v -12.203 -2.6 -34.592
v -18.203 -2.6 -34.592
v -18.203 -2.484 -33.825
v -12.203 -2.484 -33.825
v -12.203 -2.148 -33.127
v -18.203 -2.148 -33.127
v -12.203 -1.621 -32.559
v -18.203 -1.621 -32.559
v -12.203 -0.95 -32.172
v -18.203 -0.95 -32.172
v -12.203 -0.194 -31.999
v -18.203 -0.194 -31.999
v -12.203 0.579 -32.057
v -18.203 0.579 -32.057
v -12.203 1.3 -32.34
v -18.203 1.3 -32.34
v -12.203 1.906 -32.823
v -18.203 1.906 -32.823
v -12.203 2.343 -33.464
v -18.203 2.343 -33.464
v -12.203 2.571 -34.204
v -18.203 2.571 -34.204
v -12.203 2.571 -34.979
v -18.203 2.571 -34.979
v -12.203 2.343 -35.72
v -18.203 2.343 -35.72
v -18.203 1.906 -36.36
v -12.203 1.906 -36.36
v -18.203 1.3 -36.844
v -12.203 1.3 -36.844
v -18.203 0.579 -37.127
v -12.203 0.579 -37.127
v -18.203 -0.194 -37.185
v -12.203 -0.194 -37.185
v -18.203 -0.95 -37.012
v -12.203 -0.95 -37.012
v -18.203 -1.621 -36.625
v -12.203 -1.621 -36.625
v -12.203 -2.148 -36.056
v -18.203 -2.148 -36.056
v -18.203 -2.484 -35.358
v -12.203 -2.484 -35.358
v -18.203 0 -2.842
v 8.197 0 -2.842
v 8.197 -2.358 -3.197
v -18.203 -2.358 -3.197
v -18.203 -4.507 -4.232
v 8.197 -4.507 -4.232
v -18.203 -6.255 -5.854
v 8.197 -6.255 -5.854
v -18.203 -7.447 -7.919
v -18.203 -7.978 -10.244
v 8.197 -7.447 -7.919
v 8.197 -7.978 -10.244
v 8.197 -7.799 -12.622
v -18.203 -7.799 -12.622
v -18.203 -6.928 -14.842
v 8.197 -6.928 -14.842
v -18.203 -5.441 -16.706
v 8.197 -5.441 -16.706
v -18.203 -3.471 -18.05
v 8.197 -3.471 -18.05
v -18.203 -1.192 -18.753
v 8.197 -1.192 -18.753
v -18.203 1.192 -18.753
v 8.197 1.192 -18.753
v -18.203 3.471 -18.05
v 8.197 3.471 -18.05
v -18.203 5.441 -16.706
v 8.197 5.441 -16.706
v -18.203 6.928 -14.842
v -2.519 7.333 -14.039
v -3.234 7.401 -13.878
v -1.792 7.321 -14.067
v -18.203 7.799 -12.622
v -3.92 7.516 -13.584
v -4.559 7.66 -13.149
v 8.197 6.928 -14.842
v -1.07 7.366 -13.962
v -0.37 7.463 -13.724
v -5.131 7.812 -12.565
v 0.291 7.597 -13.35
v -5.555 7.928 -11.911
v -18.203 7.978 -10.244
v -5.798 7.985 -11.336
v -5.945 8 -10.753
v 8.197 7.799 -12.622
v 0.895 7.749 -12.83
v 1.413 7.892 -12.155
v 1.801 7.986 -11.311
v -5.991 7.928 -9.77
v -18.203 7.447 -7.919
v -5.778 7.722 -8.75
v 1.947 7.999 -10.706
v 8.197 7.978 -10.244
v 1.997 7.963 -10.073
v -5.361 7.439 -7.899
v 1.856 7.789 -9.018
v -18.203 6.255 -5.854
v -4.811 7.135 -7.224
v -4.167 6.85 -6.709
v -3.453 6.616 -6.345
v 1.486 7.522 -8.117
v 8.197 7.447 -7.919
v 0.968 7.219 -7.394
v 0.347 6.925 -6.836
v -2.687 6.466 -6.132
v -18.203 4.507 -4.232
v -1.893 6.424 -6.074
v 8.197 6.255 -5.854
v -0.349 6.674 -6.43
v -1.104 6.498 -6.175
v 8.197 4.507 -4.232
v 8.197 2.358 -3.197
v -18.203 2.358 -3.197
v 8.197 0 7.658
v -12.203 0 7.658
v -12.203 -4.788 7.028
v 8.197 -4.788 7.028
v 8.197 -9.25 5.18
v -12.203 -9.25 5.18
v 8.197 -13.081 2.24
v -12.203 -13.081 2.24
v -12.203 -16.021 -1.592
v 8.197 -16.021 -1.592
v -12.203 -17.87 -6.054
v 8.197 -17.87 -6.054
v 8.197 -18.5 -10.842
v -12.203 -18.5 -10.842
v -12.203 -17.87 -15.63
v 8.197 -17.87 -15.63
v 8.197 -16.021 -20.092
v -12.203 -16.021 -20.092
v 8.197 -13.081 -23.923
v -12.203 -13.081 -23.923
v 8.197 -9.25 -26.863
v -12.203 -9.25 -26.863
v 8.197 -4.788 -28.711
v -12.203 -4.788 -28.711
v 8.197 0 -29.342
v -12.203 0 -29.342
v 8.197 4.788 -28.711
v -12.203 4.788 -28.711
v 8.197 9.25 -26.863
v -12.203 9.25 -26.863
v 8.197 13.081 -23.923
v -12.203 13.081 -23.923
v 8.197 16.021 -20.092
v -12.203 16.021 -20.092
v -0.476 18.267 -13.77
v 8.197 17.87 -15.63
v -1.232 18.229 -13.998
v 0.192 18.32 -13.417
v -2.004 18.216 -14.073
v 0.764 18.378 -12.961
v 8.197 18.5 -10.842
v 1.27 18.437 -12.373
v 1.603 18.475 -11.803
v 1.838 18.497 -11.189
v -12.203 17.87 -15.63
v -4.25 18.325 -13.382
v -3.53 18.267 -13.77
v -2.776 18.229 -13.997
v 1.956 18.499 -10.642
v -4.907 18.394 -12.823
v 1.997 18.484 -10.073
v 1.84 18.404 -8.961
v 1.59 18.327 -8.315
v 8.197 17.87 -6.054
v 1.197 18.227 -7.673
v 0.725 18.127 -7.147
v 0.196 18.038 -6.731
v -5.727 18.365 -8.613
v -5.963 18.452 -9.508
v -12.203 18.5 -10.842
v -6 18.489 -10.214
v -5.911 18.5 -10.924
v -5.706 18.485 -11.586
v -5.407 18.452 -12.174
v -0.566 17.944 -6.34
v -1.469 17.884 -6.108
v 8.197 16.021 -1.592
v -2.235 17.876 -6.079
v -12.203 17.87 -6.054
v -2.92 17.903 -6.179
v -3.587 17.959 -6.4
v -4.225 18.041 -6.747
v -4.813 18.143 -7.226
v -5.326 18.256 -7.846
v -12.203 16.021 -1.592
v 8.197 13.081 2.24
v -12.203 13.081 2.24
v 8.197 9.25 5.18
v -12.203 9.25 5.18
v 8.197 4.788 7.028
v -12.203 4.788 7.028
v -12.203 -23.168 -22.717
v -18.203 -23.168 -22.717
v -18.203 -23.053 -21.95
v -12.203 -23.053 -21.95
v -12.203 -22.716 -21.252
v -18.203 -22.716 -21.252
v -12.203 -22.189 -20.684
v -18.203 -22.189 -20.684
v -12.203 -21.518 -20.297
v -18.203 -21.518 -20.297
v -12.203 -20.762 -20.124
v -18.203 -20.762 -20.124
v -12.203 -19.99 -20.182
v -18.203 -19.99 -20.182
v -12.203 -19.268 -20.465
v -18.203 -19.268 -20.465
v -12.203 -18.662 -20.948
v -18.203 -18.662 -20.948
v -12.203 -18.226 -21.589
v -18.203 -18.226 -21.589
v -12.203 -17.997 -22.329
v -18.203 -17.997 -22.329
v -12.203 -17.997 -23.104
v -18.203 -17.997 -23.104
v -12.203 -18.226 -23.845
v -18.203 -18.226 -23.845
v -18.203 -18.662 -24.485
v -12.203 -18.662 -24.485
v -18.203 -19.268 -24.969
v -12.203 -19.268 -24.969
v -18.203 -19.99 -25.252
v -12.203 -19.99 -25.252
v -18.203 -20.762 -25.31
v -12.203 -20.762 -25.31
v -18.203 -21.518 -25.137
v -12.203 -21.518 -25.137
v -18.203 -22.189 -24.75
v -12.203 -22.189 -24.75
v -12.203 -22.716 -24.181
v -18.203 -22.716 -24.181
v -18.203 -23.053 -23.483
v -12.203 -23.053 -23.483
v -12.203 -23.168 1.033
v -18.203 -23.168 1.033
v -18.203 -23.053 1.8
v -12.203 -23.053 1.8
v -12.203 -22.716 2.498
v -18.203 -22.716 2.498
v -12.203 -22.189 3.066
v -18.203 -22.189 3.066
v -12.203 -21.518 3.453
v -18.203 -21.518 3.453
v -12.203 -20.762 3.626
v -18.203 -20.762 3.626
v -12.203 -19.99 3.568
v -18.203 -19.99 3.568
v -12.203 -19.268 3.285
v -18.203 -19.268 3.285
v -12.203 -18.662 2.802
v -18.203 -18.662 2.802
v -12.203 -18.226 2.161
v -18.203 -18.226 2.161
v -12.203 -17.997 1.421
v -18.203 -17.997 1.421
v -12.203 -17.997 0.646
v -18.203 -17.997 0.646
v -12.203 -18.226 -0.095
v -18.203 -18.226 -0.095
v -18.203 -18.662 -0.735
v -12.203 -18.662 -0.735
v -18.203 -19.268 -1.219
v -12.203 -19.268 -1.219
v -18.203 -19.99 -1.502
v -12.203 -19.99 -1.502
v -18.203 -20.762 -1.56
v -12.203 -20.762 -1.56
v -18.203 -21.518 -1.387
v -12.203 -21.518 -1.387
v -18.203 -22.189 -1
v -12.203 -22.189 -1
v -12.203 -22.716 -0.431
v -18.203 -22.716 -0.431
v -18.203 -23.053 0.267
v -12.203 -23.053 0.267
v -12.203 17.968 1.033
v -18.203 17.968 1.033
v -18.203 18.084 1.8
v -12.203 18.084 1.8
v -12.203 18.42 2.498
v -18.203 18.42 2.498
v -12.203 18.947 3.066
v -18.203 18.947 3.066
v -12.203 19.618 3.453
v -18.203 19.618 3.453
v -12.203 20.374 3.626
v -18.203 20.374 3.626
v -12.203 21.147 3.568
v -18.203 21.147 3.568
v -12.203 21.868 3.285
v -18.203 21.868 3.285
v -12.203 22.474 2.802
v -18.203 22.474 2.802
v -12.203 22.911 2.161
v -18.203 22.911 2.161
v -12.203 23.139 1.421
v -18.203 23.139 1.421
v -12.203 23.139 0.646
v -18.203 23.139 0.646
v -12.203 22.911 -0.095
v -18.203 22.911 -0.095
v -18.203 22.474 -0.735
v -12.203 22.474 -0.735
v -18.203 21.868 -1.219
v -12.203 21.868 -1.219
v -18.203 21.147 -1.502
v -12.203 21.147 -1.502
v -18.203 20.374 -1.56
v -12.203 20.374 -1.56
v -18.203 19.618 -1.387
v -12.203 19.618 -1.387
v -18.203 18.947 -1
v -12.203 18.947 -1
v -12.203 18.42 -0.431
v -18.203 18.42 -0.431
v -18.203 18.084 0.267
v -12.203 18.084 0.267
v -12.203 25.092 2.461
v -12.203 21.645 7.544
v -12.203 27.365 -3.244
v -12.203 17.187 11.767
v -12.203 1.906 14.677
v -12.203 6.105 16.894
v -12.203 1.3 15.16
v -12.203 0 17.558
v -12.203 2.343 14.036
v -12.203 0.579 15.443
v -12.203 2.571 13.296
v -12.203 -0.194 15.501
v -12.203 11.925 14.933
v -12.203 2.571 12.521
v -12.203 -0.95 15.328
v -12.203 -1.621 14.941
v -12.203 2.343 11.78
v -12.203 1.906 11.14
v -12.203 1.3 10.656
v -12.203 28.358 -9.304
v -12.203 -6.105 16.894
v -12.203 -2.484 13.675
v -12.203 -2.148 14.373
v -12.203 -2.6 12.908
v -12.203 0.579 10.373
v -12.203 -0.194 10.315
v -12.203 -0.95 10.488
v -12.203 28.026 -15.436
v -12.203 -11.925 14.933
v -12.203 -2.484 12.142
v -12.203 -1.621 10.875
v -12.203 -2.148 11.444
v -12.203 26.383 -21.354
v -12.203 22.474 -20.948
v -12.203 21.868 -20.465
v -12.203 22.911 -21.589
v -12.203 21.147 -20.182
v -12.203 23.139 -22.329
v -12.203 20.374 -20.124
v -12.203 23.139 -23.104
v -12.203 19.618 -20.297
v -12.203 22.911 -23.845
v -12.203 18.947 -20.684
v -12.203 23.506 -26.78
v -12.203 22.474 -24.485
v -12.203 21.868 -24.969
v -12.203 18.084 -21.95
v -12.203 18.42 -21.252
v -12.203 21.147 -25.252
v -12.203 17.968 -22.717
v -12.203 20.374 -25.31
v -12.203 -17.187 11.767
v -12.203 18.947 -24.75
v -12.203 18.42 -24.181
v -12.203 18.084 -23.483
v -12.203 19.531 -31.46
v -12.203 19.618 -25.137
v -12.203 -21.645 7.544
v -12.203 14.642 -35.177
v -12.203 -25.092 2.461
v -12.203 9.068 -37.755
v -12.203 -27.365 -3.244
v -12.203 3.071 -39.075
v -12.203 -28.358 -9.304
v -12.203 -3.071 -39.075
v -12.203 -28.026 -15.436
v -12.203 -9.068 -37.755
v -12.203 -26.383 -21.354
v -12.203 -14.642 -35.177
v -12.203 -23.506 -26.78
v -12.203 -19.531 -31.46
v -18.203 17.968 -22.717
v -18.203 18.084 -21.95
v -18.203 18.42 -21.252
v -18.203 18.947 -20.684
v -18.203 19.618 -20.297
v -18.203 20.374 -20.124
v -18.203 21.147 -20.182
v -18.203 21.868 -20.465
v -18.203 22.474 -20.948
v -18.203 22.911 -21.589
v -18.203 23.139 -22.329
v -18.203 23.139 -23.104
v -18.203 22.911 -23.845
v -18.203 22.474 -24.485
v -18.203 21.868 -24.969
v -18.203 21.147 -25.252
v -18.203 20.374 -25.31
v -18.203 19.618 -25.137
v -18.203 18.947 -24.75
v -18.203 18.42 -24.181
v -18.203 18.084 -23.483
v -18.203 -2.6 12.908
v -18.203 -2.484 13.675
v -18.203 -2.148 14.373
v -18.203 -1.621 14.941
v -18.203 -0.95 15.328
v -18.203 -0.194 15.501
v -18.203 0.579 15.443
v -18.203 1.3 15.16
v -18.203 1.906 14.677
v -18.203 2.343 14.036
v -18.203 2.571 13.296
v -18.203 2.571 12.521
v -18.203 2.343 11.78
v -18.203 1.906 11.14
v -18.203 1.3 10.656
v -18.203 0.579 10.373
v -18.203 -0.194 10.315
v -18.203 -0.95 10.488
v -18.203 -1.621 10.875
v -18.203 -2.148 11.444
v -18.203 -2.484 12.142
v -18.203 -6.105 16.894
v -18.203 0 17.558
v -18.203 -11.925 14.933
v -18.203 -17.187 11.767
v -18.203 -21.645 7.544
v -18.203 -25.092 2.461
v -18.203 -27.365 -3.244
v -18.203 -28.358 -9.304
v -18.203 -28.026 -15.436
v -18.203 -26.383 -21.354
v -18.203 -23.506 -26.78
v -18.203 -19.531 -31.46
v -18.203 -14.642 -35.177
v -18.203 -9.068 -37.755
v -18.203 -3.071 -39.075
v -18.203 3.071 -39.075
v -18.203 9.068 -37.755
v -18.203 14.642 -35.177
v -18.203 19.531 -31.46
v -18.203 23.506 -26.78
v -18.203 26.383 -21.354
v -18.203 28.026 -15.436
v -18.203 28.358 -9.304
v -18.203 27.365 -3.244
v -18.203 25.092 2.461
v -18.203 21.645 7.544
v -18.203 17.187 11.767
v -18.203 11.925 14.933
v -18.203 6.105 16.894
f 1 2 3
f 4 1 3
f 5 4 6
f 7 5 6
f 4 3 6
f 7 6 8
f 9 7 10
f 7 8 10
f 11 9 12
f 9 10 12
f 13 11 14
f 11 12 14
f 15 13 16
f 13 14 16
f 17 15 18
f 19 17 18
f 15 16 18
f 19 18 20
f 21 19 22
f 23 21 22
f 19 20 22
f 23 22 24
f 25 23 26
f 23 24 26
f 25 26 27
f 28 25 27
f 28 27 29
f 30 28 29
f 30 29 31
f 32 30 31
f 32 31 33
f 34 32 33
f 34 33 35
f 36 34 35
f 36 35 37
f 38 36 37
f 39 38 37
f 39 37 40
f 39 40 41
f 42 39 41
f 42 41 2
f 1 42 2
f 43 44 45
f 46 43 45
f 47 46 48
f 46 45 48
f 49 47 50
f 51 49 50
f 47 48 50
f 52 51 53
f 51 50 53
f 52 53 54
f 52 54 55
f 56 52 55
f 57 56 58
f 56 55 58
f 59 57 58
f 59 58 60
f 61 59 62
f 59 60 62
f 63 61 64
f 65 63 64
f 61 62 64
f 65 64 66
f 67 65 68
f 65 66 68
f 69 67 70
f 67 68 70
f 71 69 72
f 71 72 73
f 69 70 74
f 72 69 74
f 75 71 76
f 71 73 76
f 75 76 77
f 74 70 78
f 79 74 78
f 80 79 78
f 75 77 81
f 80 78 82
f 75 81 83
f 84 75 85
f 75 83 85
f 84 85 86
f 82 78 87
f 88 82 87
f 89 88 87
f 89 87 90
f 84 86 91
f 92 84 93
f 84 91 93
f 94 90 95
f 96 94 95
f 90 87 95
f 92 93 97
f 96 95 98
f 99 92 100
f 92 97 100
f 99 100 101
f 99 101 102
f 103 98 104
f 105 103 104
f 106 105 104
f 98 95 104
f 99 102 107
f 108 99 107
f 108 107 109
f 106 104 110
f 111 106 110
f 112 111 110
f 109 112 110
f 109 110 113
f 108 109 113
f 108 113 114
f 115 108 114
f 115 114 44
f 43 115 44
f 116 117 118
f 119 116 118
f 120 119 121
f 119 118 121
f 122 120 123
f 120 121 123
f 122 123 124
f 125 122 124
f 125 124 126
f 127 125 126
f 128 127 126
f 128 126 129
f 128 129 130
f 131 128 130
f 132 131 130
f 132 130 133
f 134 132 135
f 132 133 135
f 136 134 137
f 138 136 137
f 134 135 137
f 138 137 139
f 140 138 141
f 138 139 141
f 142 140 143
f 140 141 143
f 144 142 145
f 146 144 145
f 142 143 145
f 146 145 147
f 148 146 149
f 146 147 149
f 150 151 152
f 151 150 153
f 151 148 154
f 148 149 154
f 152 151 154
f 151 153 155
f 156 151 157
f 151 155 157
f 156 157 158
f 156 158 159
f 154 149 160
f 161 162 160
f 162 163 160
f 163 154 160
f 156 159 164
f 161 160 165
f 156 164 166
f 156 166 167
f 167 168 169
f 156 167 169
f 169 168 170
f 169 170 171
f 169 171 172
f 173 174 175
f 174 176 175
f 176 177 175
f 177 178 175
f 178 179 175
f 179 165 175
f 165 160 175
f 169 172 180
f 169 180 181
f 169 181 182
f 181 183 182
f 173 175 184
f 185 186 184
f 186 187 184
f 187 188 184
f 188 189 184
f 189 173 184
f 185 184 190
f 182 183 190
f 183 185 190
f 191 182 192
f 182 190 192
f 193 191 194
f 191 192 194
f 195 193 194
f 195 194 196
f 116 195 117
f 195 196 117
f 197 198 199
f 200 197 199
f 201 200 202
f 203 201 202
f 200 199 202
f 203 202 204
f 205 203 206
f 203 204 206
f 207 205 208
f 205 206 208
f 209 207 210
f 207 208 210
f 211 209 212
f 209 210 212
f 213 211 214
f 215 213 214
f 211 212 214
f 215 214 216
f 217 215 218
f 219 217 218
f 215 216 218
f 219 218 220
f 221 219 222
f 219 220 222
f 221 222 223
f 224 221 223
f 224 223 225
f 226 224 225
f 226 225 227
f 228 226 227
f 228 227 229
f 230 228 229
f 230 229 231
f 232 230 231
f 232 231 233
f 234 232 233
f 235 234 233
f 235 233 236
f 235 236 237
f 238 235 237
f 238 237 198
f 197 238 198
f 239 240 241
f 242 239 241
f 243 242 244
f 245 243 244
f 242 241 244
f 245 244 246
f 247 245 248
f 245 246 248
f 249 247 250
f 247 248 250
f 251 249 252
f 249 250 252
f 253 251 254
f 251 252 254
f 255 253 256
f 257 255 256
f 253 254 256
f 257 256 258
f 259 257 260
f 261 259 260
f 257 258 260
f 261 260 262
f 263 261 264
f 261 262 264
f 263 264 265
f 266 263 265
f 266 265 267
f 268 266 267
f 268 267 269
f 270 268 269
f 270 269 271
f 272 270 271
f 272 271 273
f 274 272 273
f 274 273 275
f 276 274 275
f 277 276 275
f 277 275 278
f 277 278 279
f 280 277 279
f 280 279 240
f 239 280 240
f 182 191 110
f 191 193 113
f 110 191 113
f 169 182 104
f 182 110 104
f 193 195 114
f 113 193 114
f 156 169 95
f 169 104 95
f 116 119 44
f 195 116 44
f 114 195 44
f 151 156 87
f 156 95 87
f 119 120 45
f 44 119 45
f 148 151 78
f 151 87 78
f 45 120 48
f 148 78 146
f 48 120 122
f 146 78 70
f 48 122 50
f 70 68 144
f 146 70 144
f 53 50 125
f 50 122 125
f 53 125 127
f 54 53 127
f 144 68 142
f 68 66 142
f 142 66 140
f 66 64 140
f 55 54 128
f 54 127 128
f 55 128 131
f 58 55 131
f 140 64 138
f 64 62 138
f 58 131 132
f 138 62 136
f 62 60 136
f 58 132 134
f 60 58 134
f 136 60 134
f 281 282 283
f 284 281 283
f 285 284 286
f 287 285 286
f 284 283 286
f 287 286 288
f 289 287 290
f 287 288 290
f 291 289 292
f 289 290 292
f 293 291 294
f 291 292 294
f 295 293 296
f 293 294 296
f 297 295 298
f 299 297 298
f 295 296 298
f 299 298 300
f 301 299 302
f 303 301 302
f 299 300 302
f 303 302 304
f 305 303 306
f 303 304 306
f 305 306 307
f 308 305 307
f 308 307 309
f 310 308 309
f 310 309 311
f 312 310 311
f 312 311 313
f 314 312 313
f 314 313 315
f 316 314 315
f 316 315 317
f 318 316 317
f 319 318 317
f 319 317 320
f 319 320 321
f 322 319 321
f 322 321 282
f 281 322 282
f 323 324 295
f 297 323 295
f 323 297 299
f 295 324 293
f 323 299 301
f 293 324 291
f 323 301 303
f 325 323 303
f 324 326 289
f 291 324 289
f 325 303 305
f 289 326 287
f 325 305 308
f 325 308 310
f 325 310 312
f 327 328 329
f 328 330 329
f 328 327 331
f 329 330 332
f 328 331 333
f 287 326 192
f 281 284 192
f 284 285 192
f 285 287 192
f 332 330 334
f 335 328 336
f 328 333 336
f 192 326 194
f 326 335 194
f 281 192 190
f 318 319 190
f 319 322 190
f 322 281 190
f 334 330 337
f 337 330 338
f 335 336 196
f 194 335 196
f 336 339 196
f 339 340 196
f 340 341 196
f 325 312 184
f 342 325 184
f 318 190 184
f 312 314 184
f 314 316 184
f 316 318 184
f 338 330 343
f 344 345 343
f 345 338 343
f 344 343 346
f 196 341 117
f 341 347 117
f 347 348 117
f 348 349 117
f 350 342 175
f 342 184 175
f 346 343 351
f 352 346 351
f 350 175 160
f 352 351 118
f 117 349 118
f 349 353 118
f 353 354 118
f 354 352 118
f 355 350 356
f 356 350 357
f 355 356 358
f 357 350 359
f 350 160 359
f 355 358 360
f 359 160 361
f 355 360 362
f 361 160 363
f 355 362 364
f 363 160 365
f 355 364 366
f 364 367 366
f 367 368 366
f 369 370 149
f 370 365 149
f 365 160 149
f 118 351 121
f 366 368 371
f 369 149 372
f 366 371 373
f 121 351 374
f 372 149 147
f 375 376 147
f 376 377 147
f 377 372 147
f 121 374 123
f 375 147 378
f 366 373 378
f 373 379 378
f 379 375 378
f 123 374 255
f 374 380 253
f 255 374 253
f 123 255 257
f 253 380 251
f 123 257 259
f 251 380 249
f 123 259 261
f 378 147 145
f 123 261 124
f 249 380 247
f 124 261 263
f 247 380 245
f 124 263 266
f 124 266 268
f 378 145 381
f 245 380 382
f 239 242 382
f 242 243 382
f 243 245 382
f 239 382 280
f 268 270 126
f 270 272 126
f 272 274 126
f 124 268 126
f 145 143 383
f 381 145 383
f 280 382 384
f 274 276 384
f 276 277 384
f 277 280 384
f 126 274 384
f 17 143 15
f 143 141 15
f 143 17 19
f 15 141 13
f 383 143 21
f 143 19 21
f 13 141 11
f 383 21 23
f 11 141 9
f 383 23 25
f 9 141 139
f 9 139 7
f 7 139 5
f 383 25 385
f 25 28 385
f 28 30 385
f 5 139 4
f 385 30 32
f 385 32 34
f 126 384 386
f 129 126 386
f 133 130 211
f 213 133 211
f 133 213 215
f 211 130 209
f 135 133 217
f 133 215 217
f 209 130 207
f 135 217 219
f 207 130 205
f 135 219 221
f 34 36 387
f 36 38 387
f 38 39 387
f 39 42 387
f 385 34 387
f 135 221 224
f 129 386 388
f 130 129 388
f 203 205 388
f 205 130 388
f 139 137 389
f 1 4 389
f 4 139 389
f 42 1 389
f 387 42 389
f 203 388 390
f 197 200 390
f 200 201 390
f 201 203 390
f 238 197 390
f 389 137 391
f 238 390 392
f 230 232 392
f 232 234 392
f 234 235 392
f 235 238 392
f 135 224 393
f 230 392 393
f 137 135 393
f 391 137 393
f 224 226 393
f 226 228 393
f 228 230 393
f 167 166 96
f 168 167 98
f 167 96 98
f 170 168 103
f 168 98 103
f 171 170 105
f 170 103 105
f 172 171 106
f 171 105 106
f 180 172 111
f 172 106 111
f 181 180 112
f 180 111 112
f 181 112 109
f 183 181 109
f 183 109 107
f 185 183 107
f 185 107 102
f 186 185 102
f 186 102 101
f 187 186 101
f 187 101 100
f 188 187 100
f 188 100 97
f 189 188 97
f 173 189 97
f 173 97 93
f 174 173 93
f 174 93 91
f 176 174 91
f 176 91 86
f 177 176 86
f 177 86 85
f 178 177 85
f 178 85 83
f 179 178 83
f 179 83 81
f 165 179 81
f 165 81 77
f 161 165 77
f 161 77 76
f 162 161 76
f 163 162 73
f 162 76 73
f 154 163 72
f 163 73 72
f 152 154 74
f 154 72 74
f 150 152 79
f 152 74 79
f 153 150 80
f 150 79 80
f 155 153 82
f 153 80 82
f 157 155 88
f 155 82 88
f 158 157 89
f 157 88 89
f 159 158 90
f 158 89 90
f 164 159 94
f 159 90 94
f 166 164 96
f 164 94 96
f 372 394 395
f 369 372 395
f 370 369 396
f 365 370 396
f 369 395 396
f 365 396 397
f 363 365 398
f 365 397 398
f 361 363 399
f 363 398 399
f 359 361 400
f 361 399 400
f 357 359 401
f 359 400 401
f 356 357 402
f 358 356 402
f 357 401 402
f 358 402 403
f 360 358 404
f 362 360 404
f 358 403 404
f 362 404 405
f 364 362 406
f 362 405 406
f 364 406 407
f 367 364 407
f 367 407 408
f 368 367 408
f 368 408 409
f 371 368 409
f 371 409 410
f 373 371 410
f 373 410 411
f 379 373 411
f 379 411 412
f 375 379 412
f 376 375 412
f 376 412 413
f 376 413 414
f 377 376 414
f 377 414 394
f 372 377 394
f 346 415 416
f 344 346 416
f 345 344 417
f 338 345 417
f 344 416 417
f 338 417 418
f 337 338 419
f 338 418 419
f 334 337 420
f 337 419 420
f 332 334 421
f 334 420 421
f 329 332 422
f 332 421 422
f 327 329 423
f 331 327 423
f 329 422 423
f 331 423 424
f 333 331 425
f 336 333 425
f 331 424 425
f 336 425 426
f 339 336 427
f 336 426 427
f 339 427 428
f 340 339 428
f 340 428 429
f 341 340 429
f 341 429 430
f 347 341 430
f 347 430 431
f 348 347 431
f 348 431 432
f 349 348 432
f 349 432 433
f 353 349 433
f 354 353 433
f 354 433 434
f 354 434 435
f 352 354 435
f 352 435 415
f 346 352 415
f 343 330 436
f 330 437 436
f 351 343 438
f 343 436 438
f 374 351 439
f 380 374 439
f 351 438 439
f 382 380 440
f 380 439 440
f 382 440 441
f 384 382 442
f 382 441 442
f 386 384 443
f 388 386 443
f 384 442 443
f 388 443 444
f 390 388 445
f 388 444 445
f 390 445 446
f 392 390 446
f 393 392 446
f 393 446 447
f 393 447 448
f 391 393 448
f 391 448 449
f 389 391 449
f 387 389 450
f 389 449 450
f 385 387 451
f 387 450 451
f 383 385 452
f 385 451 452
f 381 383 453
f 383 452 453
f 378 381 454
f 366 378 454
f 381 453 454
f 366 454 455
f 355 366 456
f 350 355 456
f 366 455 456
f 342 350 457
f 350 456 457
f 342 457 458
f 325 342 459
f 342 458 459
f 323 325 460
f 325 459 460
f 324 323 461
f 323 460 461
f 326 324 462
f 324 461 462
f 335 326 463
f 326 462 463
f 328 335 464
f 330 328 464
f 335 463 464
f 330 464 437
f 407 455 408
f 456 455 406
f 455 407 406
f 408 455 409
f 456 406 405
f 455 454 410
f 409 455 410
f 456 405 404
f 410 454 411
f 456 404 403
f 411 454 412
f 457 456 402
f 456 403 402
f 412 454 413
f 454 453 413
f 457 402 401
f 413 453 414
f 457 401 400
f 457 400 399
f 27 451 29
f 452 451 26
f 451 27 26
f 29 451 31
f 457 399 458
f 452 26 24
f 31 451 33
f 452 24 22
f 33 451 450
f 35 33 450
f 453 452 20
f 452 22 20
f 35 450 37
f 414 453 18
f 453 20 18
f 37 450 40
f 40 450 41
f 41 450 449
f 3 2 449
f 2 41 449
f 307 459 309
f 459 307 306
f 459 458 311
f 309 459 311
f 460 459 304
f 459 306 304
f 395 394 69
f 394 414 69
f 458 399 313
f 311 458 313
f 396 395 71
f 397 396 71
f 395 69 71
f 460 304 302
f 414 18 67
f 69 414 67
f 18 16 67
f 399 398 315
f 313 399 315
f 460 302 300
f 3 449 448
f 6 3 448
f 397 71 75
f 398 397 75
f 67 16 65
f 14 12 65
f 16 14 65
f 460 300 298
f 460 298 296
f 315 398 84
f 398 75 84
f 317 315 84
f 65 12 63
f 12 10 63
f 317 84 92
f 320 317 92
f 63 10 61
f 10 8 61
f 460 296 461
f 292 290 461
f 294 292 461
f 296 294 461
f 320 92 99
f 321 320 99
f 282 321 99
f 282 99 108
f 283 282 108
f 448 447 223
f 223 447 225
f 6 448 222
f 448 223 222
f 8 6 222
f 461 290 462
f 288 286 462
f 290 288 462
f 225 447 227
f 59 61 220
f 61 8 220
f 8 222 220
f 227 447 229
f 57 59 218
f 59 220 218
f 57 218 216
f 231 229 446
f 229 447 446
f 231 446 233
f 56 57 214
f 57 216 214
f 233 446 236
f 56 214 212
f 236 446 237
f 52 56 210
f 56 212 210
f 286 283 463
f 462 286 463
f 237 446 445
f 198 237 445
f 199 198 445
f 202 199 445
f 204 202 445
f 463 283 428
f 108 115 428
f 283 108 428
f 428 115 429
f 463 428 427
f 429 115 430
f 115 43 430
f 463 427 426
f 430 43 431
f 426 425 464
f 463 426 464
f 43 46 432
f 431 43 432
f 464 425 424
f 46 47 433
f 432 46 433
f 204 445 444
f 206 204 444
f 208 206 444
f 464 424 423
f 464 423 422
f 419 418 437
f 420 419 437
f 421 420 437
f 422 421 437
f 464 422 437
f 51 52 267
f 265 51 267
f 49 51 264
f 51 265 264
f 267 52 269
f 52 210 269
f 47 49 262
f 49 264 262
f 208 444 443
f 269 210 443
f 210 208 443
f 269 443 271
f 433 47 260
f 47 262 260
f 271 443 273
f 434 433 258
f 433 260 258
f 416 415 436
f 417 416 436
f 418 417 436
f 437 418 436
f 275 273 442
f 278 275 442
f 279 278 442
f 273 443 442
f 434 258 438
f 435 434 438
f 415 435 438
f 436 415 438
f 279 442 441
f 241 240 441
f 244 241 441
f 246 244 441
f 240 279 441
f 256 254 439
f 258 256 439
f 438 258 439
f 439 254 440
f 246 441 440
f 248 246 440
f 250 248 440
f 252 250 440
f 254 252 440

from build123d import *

# Parameters (mm, degrees)
F2_R     = 2.6
F3_DEPTH = 25
F4_R     = 4
F5_DEPTH = 25


with BuildPart() as f1:
    # F0 (on Front) → F1 (revolve)
    with BuildSketch(Plane.XZ):
        Polygon((-18.202801, -2.841857), (8.197199, -2.841857), (8.197199, 7.658143), (-12.202801, 7.658143), (-12.202801, 17.558143), (-18.202801, 17.558143), align=None)
    revolve(axis=Axis((2.917131, 0, -10.841857), (1, 0, 0)))

    # F2 (on face) → F3 (cut)
    with BuildSketch(Plane(origin=(-18.202801, 0, 0), x_dir=(0, -1, 0), z_dir=(-1, 0, 0))):
        with Locations((0, 12.908143)):
            Circle(F2_R)
        with Locations((-20.568103, 1.033143)):
            Circle(F2_R)
        with Locations((-20.568103, -22.716857)):
            Circle(F2_R)
        with Locations((0, -34.591857)):
            Circle(F2_R)
        with Locations((20.568103, -22.716857)):
            Circle(F2_R)
        with Locations((20.568103, 1.033143)):
            Circle(F2_R)
    extrude(amount=-F3_DEPTH, mode=Mode.SUBTRACT)

    # F4 (on Front) → F5 (cut)
    with BuildSketch(Plane.XZ):
        with Locations((-2.002801, -10.072675)):
            Circle(F4_R)
    extrude(amount=-F5_DEPTH, mode=Mode.SUBTRACT)


solid = f1.part
